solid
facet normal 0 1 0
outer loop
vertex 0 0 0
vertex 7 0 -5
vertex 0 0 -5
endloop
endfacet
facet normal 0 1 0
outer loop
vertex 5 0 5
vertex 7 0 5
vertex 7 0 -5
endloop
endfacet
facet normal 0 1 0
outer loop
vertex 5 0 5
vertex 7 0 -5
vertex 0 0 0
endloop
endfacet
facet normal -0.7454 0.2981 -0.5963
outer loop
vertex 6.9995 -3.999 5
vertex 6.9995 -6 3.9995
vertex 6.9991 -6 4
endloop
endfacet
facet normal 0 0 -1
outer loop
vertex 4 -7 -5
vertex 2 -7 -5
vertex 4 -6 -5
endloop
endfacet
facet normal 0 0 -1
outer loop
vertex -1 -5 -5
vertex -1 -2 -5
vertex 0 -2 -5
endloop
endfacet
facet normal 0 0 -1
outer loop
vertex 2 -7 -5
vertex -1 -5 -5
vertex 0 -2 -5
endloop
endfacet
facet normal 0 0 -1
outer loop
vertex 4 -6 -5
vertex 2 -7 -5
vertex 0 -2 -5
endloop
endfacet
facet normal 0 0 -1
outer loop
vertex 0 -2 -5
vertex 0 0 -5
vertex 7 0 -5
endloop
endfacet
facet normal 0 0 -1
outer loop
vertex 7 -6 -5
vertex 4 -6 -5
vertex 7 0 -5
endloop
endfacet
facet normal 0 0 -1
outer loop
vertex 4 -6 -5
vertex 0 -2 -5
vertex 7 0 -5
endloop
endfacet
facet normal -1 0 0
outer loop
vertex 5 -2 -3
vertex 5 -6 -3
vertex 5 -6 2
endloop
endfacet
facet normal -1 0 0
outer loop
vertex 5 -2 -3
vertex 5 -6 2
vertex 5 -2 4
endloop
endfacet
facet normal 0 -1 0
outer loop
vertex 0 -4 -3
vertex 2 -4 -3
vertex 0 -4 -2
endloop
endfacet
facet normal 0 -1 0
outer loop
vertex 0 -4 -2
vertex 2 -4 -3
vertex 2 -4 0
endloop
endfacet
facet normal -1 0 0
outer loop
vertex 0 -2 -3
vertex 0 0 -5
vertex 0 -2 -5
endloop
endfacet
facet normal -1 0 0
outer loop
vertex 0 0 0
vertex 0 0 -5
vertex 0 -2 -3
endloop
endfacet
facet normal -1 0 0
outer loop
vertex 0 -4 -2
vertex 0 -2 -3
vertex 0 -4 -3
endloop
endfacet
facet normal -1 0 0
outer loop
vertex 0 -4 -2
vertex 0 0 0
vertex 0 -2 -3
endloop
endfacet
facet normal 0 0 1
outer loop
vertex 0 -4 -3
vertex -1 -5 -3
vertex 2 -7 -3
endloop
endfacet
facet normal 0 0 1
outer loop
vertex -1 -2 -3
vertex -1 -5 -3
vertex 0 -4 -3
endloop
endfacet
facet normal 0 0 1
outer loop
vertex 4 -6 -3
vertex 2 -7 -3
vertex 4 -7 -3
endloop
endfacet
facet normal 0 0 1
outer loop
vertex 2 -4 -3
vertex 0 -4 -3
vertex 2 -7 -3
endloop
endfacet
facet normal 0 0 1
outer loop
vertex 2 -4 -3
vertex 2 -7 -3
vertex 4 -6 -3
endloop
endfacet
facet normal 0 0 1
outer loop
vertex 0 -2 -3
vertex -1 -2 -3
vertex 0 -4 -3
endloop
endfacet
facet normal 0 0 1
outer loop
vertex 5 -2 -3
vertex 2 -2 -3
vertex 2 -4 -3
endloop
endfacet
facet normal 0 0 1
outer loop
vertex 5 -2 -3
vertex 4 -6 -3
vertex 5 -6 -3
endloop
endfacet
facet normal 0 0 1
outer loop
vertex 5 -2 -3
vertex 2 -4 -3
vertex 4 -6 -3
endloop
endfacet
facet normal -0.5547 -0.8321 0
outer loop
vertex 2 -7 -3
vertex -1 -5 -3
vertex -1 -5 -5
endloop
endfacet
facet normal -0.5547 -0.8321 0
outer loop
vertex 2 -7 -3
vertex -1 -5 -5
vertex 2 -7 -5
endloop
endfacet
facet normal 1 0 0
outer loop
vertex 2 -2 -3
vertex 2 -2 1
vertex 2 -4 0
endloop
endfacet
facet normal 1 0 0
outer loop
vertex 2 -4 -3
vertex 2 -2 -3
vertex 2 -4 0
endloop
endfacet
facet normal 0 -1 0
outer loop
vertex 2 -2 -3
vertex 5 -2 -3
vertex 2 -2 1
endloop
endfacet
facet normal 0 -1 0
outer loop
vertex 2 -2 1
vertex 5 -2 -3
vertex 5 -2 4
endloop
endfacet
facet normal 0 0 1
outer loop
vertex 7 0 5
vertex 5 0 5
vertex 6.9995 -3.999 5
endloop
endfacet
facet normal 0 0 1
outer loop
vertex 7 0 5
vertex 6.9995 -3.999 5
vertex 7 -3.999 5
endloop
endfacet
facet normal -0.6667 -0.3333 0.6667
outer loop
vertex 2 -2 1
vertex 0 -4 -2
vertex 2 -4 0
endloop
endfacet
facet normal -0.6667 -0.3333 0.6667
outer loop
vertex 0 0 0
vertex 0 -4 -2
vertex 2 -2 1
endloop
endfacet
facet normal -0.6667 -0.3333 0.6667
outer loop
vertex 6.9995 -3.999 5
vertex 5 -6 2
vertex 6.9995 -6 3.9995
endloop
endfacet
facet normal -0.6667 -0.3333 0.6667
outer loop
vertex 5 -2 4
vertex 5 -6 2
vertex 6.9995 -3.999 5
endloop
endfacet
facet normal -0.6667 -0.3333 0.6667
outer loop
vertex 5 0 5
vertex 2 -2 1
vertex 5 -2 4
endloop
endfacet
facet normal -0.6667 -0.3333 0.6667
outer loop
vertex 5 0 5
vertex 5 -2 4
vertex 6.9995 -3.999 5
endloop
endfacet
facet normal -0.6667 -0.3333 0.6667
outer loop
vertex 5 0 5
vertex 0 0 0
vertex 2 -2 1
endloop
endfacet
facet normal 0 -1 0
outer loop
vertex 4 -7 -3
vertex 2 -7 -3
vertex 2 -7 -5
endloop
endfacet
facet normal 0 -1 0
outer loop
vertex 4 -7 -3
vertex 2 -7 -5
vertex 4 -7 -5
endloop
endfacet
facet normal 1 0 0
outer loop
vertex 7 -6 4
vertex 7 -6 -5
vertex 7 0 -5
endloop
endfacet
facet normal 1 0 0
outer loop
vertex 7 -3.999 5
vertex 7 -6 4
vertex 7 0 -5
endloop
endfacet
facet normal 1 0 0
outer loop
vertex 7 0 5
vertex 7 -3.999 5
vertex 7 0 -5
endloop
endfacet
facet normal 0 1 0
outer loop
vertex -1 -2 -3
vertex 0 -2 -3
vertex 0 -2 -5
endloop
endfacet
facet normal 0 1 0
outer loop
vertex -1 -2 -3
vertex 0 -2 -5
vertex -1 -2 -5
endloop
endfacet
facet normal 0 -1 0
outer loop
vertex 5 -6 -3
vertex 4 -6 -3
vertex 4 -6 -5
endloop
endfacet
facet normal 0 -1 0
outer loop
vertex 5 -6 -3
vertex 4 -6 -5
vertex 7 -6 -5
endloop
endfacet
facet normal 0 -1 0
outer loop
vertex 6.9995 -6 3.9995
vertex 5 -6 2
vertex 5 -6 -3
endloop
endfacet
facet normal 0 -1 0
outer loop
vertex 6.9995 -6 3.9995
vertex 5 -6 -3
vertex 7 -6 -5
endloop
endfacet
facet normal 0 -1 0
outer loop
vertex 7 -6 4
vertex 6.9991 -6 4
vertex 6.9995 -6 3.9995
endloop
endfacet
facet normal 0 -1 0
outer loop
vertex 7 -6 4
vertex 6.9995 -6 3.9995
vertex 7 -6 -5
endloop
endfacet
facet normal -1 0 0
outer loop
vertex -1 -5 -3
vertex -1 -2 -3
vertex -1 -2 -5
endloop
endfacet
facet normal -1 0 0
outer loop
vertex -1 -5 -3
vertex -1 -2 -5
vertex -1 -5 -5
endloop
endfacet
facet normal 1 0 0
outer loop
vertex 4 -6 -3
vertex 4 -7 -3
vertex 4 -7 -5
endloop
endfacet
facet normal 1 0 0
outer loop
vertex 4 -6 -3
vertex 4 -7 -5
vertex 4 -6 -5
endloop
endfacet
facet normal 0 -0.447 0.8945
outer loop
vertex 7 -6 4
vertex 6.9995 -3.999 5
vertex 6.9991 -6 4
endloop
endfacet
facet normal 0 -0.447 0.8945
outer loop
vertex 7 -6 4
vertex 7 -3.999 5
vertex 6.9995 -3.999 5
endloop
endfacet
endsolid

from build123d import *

# Parameters (mm, degrees)
BOSS_EXTRUDE1_DEPTH = 5
CUT_EXTRUDE1_DEPTH  = 8
CUT_EXTRUDE5_DEPTH  = 3
CUT_EXTRUDE6_DEPTH  = 5
CUT_EXTRUDE7_DEPTH  = 10
CUT_EXTRUDE10_DEPTH = 1


with BuildPart() as part:
    # Sketch1 → Boss-Extrude1 (new body, symmetric)
    with BuildSketch(Plane.XY):
        Polygon((7, -6), (7, 0), (0, 0), (0, -2), (0, -4), (2, -4), (2, -2), (5, -2), (5, -6), align=None)
        Polygon((4, -6), (5, -6), (5, -2), (2, -2), (2, -4), (0, -4), (0, -2), (-1, -2), (-1, -5), (2, -7), (4, -7), align=None)
    extrude(amount=BOSS_EXTRUDE1_DEPTH, both=True)

    # Sketch2 → Cut-Extrude1 (cut)
    with BuildSketch(Plane.XY.offset(5)):
        Polygon((5, -6), (5, -2), (2, -2), (2, -4), (0, -4), (0, -2), (-1, -2), (-1, -5), (2, -7), (4, -7), (4, -6), align=None)
    extrude(amount=-CUT_EXTRUDE1_DEPTH, mode=Mode.SUBTRACT)

    # Sketch4 → Cut-Extrude5 (cut, through all)
    with BuildSketch(Plane.XZ.offset(2)):
        Polygon((5, 5), (0, 0), (0, 5), align=None)
    extrude(amount=-CUT_EXTRUDE5_DEPTH, mode=Mode.SUBTRACT)

    # Sketch5 → Cut-Extrude6 (cut, through all)
    with BuildSketch(Plane.XZ.offset(4)):
        Polygon((2, 2), (0, 0), (0, 5), (2, 5), align=None)
    extrude(amount=-CUT_EXTRUDE6_DEPTH, mode=Mode.SUBTRACT)

    # Sketch9 → Cut-Extrude7 (cut)
    with BuildSketch(Plane(origin=(0, 0, 0), x_dir=(0.596284794, 0.298142397, 0.745355992), z_dir=(-0.666666667, -0.333333333, 0.666666667))):
        Polygon((0, 0), (-2.683281573, -3.577708764), (4.829366967, -9.212195169), (9.390810676, -3.130270225), align=None)
    extrude(amount=CUT_EXTRUDE7_DEPTH, mode=Mode.SUBTRACT)

    # Sketch10 → Cut-Extrude10 (cut)
    with BuildSketch(Plane(origin=(7, 0, 0), x_dir=(0, 0, -1), z_dir=(1, 0, 0))):
        Polygon((-4, -6), (-5, -6), (-5, -3.998994023), align=None)
    extrude(amount=-CUT_EXTRUDE10_DEPTH, mode=Mode.SUBTRACT)


solid = part.part
